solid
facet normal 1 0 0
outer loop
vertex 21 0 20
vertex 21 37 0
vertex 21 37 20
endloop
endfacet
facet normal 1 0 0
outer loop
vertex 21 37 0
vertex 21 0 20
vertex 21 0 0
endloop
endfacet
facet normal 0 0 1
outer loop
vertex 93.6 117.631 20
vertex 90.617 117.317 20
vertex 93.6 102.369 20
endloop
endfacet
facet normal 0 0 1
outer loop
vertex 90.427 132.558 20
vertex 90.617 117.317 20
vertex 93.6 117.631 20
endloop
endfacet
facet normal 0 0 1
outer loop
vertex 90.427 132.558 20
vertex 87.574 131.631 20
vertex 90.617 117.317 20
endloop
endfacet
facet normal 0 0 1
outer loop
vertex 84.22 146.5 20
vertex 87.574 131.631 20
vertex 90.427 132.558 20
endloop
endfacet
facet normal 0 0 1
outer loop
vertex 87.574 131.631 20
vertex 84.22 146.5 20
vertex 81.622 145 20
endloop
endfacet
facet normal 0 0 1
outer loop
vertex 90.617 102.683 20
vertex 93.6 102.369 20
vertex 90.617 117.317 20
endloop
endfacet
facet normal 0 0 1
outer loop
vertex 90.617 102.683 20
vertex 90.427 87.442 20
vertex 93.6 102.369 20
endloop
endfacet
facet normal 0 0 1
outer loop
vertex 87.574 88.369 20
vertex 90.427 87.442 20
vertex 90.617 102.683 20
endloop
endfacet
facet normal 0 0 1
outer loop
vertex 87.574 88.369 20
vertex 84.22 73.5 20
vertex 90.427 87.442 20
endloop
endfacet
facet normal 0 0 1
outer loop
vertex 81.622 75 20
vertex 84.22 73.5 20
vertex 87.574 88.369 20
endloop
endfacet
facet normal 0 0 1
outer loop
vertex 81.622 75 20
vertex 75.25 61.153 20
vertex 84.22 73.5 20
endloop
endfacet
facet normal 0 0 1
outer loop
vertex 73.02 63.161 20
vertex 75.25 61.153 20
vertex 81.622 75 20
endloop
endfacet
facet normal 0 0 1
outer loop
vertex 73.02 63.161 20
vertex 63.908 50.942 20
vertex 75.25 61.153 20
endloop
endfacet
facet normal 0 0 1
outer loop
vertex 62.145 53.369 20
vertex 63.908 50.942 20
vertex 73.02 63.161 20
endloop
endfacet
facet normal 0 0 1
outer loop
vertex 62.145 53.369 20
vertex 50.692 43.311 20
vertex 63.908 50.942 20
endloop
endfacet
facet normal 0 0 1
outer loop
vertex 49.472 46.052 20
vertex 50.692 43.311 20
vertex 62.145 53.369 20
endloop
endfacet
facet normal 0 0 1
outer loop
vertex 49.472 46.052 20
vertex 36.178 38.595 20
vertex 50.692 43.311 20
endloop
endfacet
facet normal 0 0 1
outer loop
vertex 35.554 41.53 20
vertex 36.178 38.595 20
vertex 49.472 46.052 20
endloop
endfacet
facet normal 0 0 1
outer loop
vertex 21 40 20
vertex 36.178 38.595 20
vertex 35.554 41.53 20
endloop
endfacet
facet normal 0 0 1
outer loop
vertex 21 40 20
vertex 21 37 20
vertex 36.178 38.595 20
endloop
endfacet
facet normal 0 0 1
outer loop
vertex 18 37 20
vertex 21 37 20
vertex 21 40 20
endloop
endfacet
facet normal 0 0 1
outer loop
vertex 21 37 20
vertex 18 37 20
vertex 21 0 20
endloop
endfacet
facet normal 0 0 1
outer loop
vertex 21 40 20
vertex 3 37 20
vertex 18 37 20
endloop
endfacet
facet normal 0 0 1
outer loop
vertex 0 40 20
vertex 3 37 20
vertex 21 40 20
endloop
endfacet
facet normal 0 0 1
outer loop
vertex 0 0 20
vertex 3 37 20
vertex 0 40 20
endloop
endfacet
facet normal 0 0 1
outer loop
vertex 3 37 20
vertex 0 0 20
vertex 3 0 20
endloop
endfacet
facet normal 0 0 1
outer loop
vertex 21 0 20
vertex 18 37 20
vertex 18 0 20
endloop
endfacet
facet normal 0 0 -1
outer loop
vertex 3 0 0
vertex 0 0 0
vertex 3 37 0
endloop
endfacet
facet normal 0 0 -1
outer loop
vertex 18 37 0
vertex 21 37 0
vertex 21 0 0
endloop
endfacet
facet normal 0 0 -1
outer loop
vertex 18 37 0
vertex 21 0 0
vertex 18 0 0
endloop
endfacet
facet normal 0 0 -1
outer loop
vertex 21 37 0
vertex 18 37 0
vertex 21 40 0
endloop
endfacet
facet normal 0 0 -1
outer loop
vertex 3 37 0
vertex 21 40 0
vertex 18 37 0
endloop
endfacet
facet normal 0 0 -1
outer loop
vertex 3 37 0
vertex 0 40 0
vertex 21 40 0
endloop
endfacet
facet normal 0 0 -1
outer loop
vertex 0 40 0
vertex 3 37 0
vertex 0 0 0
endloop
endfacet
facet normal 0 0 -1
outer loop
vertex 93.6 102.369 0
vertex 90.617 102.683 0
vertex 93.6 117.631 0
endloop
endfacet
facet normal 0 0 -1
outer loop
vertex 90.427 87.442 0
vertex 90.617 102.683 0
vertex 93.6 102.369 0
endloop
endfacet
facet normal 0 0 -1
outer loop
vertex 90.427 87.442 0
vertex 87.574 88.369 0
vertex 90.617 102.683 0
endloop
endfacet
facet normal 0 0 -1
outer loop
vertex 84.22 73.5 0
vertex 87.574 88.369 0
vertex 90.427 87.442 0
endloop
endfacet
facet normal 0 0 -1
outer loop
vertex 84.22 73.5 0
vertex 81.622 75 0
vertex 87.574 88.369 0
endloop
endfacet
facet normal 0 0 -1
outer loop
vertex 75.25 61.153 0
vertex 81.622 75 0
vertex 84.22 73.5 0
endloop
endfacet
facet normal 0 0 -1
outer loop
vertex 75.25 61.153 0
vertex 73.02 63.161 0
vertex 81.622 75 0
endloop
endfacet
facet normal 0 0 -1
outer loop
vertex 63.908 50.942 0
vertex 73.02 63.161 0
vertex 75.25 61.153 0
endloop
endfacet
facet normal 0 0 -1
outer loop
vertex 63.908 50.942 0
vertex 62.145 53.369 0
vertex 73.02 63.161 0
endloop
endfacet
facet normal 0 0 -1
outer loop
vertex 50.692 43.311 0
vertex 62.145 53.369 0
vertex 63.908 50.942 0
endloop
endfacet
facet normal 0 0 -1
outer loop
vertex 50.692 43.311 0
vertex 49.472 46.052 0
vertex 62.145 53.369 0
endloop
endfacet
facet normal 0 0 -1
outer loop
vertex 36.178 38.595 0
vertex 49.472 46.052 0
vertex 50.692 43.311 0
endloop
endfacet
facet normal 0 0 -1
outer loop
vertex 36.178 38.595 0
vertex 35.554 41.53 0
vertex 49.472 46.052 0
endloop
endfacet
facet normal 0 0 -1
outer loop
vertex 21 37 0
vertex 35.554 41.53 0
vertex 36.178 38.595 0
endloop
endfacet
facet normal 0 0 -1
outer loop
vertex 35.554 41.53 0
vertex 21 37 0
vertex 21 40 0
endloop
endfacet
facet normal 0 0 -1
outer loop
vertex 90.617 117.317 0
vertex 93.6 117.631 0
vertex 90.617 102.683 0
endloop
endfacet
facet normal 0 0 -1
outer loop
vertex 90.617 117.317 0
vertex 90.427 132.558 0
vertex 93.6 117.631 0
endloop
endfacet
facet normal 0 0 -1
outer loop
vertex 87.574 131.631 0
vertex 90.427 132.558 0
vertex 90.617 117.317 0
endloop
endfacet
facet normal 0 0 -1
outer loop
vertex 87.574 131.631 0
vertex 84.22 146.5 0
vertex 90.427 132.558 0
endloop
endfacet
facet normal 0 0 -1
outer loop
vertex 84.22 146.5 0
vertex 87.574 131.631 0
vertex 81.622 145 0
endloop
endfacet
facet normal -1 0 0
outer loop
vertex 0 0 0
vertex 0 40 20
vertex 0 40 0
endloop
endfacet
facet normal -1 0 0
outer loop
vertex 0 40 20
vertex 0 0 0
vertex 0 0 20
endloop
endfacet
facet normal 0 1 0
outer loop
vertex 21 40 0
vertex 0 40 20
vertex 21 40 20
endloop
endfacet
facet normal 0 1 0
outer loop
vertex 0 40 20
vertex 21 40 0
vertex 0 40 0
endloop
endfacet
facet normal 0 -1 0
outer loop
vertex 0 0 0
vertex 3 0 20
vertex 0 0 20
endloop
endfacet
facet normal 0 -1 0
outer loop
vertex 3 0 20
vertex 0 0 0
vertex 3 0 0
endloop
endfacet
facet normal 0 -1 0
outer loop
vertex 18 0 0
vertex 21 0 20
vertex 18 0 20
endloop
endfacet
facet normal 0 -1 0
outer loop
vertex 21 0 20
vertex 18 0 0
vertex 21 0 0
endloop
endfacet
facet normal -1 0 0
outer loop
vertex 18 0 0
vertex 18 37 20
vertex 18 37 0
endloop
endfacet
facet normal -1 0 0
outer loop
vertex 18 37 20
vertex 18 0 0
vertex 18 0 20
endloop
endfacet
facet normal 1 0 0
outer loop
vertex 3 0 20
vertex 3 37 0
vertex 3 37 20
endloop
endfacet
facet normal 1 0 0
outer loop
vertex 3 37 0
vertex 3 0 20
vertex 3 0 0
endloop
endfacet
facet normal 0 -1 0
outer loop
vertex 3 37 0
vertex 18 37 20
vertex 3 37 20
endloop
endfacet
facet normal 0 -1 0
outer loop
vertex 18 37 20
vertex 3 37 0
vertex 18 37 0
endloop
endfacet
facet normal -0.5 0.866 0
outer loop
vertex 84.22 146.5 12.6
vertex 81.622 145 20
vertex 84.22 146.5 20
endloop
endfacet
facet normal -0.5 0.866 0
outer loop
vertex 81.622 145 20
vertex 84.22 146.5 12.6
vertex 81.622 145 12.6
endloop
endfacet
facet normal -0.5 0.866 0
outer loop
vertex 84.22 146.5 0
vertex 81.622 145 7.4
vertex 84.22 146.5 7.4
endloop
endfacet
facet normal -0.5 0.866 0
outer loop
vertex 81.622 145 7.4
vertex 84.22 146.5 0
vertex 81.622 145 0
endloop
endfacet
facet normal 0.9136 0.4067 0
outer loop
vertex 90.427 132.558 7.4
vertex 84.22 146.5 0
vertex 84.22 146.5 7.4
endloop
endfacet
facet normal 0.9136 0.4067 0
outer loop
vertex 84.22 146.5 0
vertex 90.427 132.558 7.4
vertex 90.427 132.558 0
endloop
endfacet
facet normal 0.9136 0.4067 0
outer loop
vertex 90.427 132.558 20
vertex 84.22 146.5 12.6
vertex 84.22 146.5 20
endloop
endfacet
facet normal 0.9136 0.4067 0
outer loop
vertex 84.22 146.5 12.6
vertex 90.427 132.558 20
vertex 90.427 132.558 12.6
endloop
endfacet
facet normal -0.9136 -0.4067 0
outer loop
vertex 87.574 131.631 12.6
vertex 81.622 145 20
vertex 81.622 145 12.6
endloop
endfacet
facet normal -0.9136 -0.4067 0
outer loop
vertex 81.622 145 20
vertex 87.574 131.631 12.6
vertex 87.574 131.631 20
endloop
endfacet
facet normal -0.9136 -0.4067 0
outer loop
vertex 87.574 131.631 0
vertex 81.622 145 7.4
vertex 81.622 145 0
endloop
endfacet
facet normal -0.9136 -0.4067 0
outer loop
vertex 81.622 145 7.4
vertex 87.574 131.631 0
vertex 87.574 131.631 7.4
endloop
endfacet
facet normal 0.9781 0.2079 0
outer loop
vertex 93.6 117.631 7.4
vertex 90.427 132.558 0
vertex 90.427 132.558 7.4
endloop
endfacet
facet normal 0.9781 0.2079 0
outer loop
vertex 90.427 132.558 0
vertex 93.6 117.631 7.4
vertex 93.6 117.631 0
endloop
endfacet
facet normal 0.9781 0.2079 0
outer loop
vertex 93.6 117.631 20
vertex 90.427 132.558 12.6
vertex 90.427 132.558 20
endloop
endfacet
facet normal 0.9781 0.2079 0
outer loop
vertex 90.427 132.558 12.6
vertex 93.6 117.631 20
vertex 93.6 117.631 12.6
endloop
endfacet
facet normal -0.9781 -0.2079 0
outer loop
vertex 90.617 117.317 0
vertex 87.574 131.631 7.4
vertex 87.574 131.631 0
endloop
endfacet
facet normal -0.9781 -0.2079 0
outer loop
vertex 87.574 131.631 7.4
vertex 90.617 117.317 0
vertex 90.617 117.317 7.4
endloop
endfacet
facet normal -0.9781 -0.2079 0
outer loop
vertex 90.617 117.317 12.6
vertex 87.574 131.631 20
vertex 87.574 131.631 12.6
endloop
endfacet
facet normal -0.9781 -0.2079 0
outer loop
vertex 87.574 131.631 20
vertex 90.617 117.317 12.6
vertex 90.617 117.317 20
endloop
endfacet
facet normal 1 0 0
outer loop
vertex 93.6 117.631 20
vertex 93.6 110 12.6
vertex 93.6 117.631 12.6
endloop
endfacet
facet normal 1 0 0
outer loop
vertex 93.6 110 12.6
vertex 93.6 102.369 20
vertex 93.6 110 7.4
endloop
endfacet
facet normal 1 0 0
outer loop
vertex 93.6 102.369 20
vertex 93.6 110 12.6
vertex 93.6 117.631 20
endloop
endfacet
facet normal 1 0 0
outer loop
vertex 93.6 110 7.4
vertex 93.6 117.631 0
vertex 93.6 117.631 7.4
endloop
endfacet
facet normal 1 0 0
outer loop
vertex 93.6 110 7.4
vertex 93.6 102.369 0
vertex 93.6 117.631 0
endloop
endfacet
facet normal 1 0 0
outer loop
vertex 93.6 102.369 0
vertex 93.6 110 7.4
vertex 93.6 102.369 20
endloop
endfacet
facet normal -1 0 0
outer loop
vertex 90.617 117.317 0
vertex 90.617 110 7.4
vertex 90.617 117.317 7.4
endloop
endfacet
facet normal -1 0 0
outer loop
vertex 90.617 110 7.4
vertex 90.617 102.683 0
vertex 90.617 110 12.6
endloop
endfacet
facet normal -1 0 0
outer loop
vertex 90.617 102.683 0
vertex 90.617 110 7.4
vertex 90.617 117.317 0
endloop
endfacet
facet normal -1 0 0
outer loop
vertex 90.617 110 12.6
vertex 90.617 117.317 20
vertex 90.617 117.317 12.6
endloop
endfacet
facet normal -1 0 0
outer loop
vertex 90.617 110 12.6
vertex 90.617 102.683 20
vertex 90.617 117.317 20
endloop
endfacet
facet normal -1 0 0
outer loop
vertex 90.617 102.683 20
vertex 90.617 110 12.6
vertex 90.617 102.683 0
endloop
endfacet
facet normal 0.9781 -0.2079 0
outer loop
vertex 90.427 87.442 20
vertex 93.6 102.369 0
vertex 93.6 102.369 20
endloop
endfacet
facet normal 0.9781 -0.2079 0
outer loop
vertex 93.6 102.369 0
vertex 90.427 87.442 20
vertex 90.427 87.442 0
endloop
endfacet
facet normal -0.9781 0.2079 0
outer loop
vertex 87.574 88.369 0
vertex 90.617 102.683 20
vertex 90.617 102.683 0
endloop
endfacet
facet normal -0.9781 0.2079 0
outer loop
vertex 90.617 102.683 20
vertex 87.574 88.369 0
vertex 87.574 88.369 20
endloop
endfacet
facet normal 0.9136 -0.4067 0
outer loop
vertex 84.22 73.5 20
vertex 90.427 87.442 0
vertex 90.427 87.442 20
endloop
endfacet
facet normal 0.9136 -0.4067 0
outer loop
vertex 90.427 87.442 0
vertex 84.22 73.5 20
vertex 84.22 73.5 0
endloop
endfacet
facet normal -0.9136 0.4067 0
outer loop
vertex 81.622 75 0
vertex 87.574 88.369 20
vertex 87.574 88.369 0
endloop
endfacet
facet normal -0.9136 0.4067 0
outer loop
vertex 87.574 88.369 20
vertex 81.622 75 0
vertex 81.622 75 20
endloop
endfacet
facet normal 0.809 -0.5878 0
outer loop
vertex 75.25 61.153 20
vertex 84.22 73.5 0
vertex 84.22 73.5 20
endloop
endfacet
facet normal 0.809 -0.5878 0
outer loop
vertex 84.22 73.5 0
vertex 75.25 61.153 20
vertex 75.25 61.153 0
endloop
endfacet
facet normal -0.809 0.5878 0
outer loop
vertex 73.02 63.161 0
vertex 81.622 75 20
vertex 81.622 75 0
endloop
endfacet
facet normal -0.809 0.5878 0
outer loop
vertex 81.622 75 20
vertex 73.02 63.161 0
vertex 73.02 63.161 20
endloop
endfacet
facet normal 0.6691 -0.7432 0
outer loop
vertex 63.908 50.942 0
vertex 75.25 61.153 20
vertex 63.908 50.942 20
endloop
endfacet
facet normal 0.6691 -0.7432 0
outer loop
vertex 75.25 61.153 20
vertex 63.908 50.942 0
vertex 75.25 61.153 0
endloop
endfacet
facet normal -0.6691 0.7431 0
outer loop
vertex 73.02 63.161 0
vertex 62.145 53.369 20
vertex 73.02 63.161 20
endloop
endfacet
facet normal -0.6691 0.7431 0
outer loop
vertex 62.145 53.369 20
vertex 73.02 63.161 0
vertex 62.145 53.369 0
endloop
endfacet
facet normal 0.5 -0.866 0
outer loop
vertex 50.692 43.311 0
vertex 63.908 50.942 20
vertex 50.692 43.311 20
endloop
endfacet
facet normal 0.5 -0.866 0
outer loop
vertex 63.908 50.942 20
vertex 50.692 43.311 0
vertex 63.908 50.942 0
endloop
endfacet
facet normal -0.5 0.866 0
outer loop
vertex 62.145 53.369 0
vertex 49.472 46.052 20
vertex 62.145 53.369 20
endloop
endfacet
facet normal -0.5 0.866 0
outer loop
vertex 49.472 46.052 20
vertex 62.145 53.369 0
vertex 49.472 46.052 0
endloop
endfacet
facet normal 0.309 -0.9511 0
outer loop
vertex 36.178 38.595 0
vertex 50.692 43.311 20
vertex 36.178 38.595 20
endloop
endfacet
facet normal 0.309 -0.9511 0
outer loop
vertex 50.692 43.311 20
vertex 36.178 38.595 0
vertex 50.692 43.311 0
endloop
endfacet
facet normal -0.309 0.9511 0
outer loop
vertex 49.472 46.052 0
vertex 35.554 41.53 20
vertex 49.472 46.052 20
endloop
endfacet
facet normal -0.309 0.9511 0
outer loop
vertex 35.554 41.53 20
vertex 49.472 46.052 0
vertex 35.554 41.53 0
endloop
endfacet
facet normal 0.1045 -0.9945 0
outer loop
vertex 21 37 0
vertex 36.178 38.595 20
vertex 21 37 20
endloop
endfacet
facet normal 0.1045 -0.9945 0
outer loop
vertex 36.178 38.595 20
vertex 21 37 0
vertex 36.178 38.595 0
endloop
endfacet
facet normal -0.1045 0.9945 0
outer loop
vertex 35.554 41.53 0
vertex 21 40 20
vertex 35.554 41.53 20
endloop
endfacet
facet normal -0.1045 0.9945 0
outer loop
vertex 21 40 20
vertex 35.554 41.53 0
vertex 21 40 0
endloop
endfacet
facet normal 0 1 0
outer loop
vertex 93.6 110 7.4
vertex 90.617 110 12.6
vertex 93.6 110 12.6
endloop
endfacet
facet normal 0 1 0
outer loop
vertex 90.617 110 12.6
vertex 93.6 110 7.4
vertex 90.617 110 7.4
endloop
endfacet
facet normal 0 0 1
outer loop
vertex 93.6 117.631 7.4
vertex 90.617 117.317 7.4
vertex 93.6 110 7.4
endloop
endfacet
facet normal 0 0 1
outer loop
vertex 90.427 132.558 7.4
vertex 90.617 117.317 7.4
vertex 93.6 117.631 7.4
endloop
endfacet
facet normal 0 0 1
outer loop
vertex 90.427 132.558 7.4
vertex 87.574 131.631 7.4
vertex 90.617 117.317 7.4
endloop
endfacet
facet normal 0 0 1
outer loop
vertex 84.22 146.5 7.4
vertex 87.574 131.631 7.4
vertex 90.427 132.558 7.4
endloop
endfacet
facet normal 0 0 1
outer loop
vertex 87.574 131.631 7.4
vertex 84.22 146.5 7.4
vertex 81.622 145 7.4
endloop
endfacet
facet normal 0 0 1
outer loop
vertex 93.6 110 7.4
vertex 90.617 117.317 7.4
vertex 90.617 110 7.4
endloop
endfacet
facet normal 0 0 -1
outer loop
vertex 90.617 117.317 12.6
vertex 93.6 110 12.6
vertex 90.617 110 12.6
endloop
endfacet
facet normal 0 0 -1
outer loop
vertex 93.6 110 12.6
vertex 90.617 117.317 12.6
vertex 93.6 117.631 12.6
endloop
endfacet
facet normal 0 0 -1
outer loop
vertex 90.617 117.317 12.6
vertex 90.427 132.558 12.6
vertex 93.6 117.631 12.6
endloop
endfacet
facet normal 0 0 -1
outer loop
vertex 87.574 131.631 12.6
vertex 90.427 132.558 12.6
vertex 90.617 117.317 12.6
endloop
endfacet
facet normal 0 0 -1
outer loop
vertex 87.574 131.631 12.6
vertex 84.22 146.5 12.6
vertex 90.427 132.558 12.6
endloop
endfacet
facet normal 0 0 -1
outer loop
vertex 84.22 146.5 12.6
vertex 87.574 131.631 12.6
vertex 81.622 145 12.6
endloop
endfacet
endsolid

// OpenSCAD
thick = 3; // 클립 두께
inner_thick = 15; // 클립 빈공간 두께

// 정면기준
depth = 40; // 클립 깊이
width = 20; // 클립 가로
height = thick * 2 + inner_thick; // 클립 세로

bridge_radius = 70; // 연결부 지름
bridge_thick = 3; // 연결부 두께

brush_thick = 5.2; // 칫솔 두께

difference(){
    cube([height, depth, width]);

    translate([thick, 0, 0])
        cube([inner_thick, depth - thick, width]);
}

difference(){
translate([height, bridge_radius + depth, 0])
    rotate([0,0,30])
        rotate_extrude(angle=-120)
            translate([bridge_radius, 0, 0])
                square([bridge_thick, width]);

translate([height - 5, bridge_radius + depth, width / 2 - brush_thick / 2])
    rotate([0,0,30])
        rotate_extrude(angle=-30)
            translate([bridge_radius, 0, 0])
                square([bridge_thick + 10, brush_thick]);
}
